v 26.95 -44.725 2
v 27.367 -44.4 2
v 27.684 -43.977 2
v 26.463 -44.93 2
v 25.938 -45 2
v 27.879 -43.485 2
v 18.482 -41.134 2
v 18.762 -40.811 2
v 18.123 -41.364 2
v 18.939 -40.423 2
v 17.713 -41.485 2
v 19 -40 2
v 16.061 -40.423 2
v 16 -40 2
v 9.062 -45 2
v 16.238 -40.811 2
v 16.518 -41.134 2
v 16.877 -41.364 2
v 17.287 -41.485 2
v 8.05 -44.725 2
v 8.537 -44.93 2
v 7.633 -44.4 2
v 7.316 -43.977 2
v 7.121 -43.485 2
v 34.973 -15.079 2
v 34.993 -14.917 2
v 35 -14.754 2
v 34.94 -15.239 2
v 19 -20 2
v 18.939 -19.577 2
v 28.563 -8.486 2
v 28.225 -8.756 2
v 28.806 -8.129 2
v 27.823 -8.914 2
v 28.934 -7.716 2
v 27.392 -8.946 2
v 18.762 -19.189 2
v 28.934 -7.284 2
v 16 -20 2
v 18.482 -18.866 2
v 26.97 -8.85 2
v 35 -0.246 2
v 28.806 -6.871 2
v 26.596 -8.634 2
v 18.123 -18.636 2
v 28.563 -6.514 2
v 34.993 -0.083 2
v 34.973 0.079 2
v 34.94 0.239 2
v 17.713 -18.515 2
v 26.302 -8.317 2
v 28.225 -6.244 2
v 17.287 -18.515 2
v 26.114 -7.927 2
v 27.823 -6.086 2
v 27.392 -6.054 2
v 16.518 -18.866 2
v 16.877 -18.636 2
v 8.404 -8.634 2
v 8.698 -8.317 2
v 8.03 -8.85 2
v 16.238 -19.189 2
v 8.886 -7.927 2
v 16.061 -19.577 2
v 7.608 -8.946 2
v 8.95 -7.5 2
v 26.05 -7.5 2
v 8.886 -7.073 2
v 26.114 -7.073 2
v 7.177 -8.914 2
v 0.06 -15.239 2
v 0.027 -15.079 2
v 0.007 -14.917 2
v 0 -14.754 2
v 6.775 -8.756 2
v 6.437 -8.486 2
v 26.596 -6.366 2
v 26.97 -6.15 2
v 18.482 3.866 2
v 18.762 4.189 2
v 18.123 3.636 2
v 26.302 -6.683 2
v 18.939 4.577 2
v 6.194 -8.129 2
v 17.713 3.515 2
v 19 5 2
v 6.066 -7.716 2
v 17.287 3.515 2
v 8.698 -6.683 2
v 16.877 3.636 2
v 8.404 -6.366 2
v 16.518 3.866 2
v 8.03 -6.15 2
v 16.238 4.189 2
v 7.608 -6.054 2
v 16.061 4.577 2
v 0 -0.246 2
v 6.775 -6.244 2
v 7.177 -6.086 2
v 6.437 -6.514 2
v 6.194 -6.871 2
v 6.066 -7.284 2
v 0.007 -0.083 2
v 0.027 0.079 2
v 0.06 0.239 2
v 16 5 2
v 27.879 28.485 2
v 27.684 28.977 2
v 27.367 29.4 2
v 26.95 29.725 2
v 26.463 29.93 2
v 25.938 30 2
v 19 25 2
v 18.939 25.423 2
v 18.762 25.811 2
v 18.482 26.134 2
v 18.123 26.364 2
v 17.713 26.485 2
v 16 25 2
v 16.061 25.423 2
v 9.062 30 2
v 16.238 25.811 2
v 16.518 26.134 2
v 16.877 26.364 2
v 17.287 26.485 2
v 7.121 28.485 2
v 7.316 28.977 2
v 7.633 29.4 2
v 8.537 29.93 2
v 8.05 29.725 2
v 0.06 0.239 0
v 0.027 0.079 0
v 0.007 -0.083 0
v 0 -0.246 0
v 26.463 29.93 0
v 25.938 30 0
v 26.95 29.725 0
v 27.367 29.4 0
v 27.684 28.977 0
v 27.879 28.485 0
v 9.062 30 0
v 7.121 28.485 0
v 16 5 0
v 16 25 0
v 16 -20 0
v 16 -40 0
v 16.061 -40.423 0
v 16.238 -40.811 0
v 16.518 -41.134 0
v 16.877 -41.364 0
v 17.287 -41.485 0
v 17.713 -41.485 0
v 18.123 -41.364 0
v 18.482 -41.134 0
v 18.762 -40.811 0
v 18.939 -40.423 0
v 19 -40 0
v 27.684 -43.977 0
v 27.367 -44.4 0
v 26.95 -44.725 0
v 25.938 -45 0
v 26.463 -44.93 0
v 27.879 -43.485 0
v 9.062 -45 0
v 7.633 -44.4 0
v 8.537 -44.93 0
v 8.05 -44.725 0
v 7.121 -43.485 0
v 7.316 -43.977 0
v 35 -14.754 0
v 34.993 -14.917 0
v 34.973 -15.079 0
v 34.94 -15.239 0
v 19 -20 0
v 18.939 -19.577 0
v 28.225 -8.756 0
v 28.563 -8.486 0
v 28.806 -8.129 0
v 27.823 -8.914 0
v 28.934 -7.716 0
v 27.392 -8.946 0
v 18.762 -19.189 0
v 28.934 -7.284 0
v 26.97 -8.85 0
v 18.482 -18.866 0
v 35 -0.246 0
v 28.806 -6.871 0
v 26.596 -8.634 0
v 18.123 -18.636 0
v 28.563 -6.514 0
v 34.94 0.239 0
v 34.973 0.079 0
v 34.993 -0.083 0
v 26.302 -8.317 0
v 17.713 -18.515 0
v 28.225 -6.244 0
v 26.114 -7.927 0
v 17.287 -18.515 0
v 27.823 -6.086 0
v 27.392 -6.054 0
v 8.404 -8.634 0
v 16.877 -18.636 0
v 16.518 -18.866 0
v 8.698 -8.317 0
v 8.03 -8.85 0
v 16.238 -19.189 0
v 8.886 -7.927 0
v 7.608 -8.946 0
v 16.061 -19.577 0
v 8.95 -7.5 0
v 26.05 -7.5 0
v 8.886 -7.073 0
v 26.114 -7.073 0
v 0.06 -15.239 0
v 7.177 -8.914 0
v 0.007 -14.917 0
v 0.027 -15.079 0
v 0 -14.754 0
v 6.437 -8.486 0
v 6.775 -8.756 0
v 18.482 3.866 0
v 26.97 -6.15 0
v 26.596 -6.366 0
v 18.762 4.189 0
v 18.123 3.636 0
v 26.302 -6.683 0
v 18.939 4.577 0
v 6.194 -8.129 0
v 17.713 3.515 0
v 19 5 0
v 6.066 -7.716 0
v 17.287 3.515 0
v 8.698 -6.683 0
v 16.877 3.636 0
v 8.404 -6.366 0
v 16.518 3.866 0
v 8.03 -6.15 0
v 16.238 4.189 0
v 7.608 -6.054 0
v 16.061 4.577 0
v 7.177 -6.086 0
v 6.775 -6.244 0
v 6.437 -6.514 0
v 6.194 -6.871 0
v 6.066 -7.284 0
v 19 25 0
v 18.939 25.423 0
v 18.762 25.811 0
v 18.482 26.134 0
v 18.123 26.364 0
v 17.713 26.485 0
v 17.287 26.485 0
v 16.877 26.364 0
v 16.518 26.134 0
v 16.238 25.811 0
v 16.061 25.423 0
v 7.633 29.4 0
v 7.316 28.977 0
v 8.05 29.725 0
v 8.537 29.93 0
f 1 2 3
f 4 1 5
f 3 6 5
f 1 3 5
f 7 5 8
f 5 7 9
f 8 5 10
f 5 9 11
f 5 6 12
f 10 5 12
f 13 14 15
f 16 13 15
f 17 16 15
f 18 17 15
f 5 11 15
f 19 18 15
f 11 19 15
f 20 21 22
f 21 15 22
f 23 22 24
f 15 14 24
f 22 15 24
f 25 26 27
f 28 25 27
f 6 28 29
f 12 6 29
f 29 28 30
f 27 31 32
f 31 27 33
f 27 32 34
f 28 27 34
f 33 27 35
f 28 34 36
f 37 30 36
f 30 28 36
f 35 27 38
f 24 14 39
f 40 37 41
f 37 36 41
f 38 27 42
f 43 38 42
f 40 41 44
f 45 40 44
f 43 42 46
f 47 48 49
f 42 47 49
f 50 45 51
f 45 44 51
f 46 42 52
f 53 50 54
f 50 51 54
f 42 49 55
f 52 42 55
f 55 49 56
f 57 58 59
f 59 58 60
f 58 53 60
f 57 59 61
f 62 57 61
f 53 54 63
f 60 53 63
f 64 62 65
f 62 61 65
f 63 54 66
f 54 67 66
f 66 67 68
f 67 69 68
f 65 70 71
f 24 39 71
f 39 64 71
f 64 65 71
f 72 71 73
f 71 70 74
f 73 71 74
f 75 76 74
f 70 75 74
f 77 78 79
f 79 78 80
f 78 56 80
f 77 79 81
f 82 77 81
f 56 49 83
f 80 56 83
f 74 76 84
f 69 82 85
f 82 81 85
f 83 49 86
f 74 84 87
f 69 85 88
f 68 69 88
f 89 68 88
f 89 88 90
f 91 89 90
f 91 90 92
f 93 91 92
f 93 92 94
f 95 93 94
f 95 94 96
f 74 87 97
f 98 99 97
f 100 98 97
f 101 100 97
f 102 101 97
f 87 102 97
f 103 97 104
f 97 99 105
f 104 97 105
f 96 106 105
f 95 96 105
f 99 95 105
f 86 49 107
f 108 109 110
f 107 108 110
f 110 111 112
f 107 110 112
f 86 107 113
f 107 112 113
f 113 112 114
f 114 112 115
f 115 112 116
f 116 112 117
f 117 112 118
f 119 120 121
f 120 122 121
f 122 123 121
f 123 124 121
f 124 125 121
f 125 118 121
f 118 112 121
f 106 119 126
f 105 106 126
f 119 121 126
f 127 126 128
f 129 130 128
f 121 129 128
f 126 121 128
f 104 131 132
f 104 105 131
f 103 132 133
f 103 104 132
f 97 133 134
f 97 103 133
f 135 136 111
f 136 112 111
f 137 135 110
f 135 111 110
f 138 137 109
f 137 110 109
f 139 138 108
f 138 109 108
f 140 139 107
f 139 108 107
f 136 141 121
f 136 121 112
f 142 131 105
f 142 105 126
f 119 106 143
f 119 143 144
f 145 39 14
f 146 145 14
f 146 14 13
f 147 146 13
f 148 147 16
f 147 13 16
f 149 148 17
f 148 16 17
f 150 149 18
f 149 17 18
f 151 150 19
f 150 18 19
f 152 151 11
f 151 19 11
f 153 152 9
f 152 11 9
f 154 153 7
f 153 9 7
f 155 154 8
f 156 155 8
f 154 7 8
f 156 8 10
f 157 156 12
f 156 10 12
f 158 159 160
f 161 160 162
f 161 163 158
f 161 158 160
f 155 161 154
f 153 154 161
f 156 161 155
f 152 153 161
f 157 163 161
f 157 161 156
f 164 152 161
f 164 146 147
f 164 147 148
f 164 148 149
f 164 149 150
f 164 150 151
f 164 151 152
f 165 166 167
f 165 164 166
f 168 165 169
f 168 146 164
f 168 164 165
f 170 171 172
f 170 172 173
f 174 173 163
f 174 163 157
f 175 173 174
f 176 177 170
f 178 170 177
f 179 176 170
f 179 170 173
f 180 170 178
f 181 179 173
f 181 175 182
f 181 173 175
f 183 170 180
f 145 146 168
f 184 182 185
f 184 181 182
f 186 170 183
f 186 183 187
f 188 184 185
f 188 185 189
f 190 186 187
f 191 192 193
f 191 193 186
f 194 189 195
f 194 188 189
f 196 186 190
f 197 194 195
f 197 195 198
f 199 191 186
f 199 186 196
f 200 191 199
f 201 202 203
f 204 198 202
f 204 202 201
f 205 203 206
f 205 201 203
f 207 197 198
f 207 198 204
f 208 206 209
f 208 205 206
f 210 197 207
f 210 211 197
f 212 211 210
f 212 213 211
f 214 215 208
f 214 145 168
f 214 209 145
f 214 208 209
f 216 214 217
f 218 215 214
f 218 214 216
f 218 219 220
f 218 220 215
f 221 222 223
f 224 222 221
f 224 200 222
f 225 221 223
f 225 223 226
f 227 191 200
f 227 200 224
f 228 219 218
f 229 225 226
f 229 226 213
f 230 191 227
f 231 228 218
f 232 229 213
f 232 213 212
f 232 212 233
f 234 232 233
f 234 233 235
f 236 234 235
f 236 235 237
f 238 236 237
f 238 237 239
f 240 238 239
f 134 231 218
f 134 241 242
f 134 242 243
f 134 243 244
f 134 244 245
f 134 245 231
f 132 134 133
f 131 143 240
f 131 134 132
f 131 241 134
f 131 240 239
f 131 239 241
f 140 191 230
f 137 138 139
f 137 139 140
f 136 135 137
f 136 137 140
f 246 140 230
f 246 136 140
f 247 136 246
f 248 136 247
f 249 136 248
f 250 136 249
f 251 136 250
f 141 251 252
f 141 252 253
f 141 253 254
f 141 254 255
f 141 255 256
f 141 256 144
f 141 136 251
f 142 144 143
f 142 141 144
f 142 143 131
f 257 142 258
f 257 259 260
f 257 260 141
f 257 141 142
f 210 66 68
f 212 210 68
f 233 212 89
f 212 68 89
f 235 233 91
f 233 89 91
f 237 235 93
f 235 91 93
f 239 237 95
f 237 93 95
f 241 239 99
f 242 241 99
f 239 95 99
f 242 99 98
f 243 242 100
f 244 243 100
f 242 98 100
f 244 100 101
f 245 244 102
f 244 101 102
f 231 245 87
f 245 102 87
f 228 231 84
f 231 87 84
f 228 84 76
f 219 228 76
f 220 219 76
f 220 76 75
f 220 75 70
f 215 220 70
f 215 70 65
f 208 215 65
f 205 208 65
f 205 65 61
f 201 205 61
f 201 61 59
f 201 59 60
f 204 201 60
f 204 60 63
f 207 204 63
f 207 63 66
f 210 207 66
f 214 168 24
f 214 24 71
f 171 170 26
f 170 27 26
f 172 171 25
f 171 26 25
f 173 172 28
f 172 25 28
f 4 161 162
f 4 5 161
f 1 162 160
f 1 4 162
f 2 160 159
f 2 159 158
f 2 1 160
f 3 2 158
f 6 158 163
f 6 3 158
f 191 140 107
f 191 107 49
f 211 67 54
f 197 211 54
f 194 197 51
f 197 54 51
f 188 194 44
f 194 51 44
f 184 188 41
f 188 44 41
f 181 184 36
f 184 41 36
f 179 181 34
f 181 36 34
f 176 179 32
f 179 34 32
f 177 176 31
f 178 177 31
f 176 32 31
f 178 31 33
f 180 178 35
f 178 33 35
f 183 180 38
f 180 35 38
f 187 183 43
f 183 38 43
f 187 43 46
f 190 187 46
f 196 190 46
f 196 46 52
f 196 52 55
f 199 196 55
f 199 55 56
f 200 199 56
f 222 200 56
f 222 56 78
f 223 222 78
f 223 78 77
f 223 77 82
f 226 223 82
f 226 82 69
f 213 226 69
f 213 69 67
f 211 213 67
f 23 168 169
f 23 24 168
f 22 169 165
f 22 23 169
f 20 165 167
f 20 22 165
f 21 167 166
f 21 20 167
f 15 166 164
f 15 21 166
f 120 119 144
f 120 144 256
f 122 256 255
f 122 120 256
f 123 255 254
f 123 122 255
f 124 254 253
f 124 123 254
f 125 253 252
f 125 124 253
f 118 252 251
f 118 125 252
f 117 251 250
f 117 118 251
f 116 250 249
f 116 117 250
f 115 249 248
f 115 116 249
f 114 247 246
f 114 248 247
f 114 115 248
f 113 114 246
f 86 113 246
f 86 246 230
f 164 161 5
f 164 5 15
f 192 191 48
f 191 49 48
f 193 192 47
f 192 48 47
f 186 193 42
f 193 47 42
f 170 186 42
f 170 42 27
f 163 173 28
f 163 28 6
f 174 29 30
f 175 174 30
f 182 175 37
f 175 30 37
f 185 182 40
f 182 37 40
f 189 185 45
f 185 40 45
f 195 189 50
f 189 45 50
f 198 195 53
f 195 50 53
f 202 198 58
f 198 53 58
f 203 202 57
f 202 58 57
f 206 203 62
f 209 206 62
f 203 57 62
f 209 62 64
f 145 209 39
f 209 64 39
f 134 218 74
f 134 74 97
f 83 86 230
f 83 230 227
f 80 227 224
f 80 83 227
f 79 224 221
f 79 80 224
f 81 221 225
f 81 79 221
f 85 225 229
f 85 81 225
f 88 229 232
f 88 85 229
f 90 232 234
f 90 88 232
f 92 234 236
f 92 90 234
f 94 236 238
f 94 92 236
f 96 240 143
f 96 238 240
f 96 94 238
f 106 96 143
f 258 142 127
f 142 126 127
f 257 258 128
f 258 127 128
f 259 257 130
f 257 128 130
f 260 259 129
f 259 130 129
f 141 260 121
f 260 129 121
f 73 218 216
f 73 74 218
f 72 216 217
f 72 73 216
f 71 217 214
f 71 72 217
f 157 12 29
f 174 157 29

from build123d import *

# Parameters (mm, degrees)
EXTRUDE_1_DEPTH     = 2
SKETCH_2_R          = 1.45
CUT_EXTRUDE_1_DEPTH = 58.043842788
FILLET_1_R          = 2


with BuildPart() as part:
    # 草图1 → 凸台-拉伸1 (new body)
    with BuildSketch(Plane.XY):
        Polygon((0, 0), (7.5, 30), (27.5, 30), (35, 0), (35, -15), (27.5, -45), (7.5, -45), (0, -15), align=None)
    extrude(amount=EXTRUDE_1_DEPTH)

    # 草图2 → 切除-拉伸1 (cut, through all)
    with BuildSketch(Plane.XY.offset(2)):
        with Locations((7.5, -7.5)):
            Circle(SKETCH_2_R)
        with Locations(Location((27.5, -7.5, 0), (0, 0, 180))):
            Circle(SKETCH_2_R)
        with BuildLine():
            Line((19, 25), (19, 5))
            ThreePointArc((19, 5), (17.5, 3.5), (16, 5))
            Line((16, 5), (16, 25))
            ThreePointArc((16, 25), (17.5, 26.5), (19, 25))
        make_face()
        with BuildLine():
            Line((19, -40), (19, -20))
            ThreePointArc((19, -20), (17.5, -18.5), (16, -20))
            Line((16, -20), (16, -40))
            ThreePointArc((16, -40), (17.5, -41.5), (19, -40))
        make_face()
    extrude(amount=-CUT_EXTRUDE_1_DEPTH, mode=Mode.SUBTRACT)

    # 圆角1
    fillet_1_edges = [part.edges().sort_by_distance(p)[0] for p in [
        (0, 0, 1),
        (7.5, 30, 1),
        (27.5, 30, 1),
        (35, 0, 1),
        (35, -15, 1),
        (27.5, -45, 1),
        (7.5, -45, 1),
        (0, -15, 1),
    ]]
    fillet(fillet_1_edges, radius=FILLET_1_R)


solid = part.part
